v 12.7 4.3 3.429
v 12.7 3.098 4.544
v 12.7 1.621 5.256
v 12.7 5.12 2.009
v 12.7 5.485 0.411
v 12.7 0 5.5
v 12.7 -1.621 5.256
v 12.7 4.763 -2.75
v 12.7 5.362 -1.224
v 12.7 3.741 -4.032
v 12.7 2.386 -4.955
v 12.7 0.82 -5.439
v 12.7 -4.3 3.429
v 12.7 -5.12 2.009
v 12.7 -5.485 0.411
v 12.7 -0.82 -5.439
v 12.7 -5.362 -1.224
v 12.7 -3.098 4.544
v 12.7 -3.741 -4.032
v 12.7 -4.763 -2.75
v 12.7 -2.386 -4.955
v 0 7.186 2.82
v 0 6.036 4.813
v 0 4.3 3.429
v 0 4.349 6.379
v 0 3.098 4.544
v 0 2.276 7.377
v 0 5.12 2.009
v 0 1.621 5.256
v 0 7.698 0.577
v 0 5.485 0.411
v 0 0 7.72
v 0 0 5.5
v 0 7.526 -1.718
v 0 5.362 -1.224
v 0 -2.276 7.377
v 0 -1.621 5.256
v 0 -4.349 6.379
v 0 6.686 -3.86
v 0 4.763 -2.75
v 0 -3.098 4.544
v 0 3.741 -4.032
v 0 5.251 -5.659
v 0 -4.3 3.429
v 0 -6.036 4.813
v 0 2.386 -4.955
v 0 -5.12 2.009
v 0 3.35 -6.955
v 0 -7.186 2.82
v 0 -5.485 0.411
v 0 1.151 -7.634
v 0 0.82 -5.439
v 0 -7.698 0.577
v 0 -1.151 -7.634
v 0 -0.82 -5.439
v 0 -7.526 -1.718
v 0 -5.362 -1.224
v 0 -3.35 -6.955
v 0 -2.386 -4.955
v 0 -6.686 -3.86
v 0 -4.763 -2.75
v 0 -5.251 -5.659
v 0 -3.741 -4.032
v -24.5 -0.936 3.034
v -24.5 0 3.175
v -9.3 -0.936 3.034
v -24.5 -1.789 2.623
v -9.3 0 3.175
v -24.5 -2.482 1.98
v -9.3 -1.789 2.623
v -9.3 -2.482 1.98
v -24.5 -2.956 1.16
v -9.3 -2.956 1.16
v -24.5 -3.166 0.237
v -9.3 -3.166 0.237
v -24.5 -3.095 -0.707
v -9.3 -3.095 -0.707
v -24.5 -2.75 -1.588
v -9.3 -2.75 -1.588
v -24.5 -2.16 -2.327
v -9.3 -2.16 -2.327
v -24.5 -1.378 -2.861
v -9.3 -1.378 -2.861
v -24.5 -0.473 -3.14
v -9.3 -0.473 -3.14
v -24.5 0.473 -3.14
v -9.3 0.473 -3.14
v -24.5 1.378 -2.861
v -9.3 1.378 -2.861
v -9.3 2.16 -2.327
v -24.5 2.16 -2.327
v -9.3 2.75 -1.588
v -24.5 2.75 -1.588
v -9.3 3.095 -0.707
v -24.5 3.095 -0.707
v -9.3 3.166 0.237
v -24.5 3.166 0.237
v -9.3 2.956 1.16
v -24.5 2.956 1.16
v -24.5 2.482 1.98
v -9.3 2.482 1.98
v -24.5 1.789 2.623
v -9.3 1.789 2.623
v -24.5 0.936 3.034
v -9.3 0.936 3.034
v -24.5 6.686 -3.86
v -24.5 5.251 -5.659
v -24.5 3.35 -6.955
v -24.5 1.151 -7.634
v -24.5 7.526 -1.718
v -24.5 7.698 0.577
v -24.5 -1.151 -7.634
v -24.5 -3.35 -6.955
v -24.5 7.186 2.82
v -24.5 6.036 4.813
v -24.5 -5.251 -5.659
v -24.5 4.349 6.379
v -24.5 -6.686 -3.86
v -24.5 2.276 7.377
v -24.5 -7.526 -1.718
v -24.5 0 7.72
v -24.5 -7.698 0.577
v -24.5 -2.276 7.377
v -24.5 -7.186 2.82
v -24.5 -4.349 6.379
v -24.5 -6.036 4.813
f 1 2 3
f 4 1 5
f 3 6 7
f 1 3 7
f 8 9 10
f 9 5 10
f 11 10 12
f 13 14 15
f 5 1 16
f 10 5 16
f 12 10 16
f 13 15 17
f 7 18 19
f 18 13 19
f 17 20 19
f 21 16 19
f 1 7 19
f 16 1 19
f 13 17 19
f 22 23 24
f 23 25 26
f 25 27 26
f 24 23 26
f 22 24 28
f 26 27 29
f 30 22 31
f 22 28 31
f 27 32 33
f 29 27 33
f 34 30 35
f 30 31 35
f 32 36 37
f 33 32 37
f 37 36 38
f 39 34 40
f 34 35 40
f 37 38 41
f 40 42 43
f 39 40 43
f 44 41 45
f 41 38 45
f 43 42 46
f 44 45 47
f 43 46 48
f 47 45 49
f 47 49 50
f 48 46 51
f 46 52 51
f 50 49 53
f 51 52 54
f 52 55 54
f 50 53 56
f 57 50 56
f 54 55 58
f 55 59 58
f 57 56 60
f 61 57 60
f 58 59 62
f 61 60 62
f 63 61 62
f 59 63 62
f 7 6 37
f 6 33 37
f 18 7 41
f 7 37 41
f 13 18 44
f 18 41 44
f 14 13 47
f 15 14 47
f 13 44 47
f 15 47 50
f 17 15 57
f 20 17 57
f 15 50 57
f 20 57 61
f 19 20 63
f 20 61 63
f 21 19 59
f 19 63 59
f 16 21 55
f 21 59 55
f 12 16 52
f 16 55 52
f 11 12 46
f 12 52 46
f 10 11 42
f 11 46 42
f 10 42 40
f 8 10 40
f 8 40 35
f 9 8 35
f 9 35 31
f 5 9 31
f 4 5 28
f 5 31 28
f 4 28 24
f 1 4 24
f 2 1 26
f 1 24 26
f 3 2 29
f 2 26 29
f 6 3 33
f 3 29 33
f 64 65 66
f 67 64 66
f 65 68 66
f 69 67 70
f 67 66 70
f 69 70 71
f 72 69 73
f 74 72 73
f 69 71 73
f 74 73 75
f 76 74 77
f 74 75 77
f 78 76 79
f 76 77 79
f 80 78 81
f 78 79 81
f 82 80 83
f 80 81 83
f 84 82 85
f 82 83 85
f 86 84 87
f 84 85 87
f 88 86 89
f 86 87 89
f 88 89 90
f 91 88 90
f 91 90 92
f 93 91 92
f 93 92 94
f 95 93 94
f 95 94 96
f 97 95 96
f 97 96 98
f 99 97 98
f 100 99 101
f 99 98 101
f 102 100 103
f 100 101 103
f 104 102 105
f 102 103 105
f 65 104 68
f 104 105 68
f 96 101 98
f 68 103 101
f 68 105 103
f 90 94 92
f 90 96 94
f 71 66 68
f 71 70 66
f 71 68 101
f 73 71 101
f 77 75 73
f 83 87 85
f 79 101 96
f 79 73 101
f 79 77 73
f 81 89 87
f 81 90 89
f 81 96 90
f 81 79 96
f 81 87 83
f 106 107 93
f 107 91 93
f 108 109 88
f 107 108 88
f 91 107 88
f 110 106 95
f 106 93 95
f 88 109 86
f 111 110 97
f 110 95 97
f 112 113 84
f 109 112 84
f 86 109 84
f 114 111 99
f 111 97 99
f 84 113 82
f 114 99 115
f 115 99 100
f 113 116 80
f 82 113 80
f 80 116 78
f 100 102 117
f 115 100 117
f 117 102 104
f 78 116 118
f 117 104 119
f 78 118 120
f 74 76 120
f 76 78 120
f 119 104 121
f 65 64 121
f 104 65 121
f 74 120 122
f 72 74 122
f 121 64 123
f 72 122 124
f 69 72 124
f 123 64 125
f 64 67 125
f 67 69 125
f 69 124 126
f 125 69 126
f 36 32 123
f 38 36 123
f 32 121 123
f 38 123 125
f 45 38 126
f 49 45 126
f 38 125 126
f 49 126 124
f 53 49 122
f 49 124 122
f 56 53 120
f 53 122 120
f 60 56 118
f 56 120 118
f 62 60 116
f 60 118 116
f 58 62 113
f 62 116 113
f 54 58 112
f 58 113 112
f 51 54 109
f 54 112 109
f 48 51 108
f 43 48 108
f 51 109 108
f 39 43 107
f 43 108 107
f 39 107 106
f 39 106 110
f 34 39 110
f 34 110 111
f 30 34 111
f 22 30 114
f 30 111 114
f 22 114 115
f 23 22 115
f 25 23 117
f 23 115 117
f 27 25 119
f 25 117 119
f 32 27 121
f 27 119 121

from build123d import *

# Parameters (mm, degrees)
SOCKET_1_SKETCH_W = 16.2
SOCKET_1_SKETCH_H = 3.175


with BuildPart() as part:
    # Conn_T4_MNPT Sketch → Conn_T4_MNPT (revolve)
    with BuildSketch(Plane.XY):
        Polygon((12.7, 0), (12.7, 5.5), (0, 5.5), (0, 7.72), (-24.5, 7.72), (-24.5, 0), align=None)
    revolve(axis=Axis((-1000, 0, 0), (1, 0, 0)))

    # Socket 1 Sketch → Socket 1 (revolve, cut)
    with BuildSketch(Plane.XY):
        with Locations((-17.4, 1.5875)):
            Rectangle(SOCKET_1_SKETCH_W, SOCKET_1_SKETCH_H)
    revolve(axis=Axis((-1000, 0, 0), (1, 0, 0)), mode=Mode.SUBTRACT)


solid = part.part
